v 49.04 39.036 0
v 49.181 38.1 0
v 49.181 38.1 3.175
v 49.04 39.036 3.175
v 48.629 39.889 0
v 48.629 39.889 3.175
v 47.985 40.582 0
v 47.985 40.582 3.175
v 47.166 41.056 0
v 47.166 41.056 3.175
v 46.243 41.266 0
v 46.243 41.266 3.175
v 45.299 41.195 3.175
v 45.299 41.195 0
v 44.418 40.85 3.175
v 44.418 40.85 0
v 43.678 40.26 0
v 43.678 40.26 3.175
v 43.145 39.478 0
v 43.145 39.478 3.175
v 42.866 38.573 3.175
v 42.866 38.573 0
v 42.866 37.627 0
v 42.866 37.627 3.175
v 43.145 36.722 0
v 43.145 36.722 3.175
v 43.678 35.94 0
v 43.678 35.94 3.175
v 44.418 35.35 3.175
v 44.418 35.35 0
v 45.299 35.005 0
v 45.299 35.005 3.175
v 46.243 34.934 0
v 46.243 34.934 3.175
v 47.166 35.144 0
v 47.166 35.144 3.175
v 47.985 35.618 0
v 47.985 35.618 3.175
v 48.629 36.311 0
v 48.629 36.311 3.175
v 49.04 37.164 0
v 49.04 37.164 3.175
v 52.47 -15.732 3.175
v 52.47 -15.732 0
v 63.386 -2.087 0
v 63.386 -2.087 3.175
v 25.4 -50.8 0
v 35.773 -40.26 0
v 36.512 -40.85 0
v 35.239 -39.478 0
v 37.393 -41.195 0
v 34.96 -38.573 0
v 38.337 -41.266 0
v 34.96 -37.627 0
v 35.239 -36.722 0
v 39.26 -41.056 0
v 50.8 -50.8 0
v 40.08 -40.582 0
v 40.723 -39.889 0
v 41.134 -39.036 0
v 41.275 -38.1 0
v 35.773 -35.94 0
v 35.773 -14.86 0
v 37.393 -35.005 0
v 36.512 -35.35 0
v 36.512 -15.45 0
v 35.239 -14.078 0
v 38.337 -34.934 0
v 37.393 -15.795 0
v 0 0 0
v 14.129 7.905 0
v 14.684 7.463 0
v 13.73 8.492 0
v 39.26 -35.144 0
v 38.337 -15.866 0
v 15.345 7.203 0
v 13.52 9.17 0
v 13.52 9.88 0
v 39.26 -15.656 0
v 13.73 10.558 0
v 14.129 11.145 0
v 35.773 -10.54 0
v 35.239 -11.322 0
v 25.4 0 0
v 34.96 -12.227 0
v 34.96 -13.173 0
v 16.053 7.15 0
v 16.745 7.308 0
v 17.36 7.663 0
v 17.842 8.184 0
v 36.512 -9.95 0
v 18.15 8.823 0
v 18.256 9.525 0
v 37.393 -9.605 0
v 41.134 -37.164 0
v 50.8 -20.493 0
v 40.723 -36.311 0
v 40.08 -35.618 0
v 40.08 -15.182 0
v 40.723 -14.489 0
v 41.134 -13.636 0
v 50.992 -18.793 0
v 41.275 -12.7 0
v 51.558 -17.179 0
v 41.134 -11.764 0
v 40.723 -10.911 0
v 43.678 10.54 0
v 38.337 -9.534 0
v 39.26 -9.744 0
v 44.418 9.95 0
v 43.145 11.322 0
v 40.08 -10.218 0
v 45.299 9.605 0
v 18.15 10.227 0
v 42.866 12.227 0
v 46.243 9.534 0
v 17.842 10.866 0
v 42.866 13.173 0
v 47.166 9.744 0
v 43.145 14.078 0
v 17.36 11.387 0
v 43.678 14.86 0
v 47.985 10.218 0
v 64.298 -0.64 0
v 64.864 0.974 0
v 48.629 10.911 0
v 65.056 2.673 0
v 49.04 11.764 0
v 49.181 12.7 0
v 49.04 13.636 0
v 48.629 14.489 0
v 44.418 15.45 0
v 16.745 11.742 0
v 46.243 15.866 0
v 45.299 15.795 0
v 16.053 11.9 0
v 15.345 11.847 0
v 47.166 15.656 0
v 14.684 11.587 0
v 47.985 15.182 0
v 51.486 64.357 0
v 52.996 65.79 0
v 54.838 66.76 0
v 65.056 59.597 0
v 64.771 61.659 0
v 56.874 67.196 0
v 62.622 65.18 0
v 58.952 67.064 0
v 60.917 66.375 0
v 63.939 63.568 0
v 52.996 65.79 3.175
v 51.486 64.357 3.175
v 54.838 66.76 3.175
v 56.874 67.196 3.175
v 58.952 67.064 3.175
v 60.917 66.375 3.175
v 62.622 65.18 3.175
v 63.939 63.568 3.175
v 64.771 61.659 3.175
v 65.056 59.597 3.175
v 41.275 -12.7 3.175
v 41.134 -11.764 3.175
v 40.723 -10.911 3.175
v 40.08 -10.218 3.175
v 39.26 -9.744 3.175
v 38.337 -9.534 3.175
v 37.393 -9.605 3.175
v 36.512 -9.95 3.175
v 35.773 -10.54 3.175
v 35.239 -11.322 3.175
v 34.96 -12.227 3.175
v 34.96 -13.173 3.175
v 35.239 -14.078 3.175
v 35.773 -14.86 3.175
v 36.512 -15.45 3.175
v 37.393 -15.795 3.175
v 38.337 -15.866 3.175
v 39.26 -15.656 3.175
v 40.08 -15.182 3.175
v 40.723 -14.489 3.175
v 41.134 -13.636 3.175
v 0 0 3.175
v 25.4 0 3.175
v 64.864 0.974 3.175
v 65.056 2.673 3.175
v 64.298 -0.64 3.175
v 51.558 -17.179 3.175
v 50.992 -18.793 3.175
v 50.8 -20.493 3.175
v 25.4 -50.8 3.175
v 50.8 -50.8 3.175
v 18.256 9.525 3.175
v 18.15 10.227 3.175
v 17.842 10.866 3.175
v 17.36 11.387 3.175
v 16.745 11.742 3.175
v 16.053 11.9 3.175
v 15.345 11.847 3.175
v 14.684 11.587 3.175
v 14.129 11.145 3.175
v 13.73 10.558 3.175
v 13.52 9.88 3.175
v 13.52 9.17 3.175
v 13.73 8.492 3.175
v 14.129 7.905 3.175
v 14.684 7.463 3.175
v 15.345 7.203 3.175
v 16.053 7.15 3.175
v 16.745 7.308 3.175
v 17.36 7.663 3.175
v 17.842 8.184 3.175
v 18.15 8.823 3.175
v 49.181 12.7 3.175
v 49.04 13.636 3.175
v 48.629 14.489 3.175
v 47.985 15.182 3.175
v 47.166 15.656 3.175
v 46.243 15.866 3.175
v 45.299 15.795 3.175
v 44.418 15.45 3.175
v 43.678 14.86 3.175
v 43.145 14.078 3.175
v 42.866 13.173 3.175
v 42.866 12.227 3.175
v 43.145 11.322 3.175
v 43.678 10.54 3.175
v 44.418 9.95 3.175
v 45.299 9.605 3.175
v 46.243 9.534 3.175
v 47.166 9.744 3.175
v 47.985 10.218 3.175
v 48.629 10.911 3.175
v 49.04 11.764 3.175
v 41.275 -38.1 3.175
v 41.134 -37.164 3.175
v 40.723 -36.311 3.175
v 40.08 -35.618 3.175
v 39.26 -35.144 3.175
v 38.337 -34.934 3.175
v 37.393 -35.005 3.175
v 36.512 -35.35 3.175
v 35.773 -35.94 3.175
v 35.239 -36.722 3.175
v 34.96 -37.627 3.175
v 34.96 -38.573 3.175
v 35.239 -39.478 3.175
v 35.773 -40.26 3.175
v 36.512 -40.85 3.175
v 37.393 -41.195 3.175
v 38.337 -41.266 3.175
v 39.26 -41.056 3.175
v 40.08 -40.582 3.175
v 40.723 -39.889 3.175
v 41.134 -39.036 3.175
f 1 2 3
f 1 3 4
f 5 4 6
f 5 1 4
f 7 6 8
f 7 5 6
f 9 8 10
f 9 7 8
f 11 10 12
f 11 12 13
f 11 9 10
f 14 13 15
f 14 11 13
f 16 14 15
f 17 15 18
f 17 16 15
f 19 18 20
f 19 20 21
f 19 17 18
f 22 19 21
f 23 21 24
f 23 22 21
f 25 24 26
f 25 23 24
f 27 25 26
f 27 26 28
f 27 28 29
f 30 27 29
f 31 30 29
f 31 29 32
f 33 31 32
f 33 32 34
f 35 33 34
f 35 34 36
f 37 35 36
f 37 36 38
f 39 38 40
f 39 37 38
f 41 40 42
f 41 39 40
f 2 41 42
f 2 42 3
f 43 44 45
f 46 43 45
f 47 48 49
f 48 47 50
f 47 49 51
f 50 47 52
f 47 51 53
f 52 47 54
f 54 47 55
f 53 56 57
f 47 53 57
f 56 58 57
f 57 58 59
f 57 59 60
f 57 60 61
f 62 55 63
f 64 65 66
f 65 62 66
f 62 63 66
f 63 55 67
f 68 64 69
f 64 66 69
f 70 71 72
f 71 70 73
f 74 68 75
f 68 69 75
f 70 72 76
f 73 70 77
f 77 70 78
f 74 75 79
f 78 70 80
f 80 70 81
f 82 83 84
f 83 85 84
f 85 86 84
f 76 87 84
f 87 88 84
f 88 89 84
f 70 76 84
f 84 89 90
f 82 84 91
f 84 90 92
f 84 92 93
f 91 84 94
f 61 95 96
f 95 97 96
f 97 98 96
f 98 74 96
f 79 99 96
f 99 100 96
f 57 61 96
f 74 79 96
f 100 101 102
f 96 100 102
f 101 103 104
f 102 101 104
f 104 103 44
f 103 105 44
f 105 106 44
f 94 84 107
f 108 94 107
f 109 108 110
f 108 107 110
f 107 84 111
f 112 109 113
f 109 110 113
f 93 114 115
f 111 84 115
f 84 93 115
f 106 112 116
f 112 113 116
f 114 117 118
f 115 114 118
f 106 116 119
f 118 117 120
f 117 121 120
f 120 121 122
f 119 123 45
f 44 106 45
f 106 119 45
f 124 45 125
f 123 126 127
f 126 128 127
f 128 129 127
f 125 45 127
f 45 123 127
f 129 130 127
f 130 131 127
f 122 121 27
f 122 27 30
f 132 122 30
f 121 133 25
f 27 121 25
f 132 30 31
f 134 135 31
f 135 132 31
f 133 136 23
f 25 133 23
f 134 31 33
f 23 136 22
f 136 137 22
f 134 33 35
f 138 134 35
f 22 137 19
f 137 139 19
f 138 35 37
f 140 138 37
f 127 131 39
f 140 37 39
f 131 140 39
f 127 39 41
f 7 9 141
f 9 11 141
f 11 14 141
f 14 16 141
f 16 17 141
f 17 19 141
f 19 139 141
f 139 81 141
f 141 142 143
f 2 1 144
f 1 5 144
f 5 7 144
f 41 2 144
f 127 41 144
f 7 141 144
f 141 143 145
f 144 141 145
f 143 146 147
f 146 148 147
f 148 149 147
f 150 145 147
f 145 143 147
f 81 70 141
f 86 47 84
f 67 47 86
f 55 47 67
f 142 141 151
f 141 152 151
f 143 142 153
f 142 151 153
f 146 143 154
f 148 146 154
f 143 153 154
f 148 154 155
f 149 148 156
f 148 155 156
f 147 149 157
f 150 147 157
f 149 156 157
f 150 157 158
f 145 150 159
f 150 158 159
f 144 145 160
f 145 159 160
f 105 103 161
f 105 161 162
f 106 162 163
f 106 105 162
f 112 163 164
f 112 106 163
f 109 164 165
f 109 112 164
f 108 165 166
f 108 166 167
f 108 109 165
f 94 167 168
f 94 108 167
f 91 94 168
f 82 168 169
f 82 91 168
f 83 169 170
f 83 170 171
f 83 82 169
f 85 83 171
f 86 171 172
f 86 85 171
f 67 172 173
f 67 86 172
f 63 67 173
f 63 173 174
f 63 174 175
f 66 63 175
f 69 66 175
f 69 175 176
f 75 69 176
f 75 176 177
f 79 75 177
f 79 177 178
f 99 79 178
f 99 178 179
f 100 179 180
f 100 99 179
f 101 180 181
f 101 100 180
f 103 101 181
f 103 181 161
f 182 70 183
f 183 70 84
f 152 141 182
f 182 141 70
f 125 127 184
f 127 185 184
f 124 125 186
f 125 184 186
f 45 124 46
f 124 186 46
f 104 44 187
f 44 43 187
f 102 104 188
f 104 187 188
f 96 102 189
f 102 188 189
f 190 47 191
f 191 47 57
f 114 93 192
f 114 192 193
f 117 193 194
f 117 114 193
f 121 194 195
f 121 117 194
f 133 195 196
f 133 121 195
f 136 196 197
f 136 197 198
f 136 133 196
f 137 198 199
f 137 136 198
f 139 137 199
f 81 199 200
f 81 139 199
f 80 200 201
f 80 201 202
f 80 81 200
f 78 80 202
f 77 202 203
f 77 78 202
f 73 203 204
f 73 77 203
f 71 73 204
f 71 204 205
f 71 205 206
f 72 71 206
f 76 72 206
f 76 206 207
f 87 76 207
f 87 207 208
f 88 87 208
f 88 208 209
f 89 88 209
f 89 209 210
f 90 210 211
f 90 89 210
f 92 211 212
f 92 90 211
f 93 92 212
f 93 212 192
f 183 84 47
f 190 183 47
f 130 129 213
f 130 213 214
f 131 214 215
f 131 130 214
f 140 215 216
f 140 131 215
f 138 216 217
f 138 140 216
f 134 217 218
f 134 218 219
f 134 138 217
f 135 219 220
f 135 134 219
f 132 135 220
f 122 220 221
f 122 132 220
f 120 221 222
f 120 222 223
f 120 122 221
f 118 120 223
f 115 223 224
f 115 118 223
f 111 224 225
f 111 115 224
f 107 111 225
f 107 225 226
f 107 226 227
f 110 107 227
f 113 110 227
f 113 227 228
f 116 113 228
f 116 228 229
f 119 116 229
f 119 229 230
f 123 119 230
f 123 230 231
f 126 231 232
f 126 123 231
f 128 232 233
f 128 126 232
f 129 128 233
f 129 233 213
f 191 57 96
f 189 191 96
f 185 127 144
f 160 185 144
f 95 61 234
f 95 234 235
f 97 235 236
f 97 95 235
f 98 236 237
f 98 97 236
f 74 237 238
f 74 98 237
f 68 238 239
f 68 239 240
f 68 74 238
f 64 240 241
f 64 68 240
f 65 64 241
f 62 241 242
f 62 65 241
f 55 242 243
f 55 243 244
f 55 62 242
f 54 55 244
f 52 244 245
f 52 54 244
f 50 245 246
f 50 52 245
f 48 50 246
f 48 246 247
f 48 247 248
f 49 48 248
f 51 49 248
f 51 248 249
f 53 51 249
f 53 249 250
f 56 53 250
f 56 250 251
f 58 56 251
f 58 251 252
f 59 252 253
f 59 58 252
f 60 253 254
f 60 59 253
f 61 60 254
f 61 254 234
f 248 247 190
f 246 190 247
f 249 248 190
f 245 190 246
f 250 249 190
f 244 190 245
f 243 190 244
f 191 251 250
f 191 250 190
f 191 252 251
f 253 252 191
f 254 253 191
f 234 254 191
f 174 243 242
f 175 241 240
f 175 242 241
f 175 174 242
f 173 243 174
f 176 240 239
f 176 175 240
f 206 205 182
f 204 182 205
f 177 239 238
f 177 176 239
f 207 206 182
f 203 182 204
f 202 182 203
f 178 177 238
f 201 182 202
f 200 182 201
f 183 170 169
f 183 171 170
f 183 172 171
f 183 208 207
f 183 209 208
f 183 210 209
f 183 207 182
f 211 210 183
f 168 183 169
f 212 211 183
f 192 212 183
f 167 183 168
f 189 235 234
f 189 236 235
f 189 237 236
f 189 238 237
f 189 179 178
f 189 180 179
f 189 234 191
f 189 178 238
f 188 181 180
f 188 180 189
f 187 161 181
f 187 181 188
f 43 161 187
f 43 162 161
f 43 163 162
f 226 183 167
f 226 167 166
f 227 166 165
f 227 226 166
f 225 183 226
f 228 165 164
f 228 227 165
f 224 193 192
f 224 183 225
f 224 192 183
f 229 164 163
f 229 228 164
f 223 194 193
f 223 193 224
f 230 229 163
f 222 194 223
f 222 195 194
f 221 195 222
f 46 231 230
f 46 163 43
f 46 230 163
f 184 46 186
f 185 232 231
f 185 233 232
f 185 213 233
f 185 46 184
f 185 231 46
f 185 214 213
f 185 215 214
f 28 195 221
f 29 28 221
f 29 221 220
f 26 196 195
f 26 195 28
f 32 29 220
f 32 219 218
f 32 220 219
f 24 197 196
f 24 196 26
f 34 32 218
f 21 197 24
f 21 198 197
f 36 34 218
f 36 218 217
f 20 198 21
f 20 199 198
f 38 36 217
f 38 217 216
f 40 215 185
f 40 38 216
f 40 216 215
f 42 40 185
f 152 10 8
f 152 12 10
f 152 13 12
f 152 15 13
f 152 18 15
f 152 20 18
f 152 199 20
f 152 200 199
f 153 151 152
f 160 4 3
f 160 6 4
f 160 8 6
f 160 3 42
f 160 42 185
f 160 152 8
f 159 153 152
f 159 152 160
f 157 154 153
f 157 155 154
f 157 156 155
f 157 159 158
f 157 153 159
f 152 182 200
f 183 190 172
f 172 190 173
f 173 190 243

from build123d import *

# Parameters (mm, degrees)
SKETCH1_R           = 2.38125
SKETCH1_R_2         = 3.175
BOSS_EXTRUDE1_DEPTH = 3.175
FILLET1_R           = 7.62


with BuildPart() as part:
    # Sketch1 → Boss-Extrude1 (new body)
    with BuildSketch(Plane.XY):
        Polygon((0, 0), (25.4, 0), (25.4, -50.8), (50.8, -50.8), (50.8, -17.819677815), (65.055742252, 0), (65.055742252, 81.319677815), align=None)
        with Locations((15.875, 9.525)):
            Circle(SKETCH1_R, mode=Mode.SUBTRACT)
        with Locations((46.005742252, 38.1)):
            Circle(SKETCH1_R_2, mode=Mode.SUBTRACT)
        with Locations((46.005742252, 12.7)):
            Circle(SKETCH1_R_2, mode=Mode.SUBTRACT)
        with Locations((38.1, -12.7)):
            Circle(SKETCH1_R_2, mode=Mode.SUBTRACT)
        with Locations((38.1, -38.1)):
            Circle(SKETCH1_R_2, mode=Mode.SUBTRACT)
    extrude(amount=BOSS_EXTRUDE1_DEPTH)

    # Fillet1
    fillet1_edges = [part.edges().sort_by_distance(p)[0] for p in [
        (65.055742252, 81.319677815, 1.5875),
        (65.055742252, 0, 1.5875),
        (50.8, -17.819677815, 1.5875),
    ]]
    fillet(fillet1_edges, radius=FILLET1_R)


solid = part.part
